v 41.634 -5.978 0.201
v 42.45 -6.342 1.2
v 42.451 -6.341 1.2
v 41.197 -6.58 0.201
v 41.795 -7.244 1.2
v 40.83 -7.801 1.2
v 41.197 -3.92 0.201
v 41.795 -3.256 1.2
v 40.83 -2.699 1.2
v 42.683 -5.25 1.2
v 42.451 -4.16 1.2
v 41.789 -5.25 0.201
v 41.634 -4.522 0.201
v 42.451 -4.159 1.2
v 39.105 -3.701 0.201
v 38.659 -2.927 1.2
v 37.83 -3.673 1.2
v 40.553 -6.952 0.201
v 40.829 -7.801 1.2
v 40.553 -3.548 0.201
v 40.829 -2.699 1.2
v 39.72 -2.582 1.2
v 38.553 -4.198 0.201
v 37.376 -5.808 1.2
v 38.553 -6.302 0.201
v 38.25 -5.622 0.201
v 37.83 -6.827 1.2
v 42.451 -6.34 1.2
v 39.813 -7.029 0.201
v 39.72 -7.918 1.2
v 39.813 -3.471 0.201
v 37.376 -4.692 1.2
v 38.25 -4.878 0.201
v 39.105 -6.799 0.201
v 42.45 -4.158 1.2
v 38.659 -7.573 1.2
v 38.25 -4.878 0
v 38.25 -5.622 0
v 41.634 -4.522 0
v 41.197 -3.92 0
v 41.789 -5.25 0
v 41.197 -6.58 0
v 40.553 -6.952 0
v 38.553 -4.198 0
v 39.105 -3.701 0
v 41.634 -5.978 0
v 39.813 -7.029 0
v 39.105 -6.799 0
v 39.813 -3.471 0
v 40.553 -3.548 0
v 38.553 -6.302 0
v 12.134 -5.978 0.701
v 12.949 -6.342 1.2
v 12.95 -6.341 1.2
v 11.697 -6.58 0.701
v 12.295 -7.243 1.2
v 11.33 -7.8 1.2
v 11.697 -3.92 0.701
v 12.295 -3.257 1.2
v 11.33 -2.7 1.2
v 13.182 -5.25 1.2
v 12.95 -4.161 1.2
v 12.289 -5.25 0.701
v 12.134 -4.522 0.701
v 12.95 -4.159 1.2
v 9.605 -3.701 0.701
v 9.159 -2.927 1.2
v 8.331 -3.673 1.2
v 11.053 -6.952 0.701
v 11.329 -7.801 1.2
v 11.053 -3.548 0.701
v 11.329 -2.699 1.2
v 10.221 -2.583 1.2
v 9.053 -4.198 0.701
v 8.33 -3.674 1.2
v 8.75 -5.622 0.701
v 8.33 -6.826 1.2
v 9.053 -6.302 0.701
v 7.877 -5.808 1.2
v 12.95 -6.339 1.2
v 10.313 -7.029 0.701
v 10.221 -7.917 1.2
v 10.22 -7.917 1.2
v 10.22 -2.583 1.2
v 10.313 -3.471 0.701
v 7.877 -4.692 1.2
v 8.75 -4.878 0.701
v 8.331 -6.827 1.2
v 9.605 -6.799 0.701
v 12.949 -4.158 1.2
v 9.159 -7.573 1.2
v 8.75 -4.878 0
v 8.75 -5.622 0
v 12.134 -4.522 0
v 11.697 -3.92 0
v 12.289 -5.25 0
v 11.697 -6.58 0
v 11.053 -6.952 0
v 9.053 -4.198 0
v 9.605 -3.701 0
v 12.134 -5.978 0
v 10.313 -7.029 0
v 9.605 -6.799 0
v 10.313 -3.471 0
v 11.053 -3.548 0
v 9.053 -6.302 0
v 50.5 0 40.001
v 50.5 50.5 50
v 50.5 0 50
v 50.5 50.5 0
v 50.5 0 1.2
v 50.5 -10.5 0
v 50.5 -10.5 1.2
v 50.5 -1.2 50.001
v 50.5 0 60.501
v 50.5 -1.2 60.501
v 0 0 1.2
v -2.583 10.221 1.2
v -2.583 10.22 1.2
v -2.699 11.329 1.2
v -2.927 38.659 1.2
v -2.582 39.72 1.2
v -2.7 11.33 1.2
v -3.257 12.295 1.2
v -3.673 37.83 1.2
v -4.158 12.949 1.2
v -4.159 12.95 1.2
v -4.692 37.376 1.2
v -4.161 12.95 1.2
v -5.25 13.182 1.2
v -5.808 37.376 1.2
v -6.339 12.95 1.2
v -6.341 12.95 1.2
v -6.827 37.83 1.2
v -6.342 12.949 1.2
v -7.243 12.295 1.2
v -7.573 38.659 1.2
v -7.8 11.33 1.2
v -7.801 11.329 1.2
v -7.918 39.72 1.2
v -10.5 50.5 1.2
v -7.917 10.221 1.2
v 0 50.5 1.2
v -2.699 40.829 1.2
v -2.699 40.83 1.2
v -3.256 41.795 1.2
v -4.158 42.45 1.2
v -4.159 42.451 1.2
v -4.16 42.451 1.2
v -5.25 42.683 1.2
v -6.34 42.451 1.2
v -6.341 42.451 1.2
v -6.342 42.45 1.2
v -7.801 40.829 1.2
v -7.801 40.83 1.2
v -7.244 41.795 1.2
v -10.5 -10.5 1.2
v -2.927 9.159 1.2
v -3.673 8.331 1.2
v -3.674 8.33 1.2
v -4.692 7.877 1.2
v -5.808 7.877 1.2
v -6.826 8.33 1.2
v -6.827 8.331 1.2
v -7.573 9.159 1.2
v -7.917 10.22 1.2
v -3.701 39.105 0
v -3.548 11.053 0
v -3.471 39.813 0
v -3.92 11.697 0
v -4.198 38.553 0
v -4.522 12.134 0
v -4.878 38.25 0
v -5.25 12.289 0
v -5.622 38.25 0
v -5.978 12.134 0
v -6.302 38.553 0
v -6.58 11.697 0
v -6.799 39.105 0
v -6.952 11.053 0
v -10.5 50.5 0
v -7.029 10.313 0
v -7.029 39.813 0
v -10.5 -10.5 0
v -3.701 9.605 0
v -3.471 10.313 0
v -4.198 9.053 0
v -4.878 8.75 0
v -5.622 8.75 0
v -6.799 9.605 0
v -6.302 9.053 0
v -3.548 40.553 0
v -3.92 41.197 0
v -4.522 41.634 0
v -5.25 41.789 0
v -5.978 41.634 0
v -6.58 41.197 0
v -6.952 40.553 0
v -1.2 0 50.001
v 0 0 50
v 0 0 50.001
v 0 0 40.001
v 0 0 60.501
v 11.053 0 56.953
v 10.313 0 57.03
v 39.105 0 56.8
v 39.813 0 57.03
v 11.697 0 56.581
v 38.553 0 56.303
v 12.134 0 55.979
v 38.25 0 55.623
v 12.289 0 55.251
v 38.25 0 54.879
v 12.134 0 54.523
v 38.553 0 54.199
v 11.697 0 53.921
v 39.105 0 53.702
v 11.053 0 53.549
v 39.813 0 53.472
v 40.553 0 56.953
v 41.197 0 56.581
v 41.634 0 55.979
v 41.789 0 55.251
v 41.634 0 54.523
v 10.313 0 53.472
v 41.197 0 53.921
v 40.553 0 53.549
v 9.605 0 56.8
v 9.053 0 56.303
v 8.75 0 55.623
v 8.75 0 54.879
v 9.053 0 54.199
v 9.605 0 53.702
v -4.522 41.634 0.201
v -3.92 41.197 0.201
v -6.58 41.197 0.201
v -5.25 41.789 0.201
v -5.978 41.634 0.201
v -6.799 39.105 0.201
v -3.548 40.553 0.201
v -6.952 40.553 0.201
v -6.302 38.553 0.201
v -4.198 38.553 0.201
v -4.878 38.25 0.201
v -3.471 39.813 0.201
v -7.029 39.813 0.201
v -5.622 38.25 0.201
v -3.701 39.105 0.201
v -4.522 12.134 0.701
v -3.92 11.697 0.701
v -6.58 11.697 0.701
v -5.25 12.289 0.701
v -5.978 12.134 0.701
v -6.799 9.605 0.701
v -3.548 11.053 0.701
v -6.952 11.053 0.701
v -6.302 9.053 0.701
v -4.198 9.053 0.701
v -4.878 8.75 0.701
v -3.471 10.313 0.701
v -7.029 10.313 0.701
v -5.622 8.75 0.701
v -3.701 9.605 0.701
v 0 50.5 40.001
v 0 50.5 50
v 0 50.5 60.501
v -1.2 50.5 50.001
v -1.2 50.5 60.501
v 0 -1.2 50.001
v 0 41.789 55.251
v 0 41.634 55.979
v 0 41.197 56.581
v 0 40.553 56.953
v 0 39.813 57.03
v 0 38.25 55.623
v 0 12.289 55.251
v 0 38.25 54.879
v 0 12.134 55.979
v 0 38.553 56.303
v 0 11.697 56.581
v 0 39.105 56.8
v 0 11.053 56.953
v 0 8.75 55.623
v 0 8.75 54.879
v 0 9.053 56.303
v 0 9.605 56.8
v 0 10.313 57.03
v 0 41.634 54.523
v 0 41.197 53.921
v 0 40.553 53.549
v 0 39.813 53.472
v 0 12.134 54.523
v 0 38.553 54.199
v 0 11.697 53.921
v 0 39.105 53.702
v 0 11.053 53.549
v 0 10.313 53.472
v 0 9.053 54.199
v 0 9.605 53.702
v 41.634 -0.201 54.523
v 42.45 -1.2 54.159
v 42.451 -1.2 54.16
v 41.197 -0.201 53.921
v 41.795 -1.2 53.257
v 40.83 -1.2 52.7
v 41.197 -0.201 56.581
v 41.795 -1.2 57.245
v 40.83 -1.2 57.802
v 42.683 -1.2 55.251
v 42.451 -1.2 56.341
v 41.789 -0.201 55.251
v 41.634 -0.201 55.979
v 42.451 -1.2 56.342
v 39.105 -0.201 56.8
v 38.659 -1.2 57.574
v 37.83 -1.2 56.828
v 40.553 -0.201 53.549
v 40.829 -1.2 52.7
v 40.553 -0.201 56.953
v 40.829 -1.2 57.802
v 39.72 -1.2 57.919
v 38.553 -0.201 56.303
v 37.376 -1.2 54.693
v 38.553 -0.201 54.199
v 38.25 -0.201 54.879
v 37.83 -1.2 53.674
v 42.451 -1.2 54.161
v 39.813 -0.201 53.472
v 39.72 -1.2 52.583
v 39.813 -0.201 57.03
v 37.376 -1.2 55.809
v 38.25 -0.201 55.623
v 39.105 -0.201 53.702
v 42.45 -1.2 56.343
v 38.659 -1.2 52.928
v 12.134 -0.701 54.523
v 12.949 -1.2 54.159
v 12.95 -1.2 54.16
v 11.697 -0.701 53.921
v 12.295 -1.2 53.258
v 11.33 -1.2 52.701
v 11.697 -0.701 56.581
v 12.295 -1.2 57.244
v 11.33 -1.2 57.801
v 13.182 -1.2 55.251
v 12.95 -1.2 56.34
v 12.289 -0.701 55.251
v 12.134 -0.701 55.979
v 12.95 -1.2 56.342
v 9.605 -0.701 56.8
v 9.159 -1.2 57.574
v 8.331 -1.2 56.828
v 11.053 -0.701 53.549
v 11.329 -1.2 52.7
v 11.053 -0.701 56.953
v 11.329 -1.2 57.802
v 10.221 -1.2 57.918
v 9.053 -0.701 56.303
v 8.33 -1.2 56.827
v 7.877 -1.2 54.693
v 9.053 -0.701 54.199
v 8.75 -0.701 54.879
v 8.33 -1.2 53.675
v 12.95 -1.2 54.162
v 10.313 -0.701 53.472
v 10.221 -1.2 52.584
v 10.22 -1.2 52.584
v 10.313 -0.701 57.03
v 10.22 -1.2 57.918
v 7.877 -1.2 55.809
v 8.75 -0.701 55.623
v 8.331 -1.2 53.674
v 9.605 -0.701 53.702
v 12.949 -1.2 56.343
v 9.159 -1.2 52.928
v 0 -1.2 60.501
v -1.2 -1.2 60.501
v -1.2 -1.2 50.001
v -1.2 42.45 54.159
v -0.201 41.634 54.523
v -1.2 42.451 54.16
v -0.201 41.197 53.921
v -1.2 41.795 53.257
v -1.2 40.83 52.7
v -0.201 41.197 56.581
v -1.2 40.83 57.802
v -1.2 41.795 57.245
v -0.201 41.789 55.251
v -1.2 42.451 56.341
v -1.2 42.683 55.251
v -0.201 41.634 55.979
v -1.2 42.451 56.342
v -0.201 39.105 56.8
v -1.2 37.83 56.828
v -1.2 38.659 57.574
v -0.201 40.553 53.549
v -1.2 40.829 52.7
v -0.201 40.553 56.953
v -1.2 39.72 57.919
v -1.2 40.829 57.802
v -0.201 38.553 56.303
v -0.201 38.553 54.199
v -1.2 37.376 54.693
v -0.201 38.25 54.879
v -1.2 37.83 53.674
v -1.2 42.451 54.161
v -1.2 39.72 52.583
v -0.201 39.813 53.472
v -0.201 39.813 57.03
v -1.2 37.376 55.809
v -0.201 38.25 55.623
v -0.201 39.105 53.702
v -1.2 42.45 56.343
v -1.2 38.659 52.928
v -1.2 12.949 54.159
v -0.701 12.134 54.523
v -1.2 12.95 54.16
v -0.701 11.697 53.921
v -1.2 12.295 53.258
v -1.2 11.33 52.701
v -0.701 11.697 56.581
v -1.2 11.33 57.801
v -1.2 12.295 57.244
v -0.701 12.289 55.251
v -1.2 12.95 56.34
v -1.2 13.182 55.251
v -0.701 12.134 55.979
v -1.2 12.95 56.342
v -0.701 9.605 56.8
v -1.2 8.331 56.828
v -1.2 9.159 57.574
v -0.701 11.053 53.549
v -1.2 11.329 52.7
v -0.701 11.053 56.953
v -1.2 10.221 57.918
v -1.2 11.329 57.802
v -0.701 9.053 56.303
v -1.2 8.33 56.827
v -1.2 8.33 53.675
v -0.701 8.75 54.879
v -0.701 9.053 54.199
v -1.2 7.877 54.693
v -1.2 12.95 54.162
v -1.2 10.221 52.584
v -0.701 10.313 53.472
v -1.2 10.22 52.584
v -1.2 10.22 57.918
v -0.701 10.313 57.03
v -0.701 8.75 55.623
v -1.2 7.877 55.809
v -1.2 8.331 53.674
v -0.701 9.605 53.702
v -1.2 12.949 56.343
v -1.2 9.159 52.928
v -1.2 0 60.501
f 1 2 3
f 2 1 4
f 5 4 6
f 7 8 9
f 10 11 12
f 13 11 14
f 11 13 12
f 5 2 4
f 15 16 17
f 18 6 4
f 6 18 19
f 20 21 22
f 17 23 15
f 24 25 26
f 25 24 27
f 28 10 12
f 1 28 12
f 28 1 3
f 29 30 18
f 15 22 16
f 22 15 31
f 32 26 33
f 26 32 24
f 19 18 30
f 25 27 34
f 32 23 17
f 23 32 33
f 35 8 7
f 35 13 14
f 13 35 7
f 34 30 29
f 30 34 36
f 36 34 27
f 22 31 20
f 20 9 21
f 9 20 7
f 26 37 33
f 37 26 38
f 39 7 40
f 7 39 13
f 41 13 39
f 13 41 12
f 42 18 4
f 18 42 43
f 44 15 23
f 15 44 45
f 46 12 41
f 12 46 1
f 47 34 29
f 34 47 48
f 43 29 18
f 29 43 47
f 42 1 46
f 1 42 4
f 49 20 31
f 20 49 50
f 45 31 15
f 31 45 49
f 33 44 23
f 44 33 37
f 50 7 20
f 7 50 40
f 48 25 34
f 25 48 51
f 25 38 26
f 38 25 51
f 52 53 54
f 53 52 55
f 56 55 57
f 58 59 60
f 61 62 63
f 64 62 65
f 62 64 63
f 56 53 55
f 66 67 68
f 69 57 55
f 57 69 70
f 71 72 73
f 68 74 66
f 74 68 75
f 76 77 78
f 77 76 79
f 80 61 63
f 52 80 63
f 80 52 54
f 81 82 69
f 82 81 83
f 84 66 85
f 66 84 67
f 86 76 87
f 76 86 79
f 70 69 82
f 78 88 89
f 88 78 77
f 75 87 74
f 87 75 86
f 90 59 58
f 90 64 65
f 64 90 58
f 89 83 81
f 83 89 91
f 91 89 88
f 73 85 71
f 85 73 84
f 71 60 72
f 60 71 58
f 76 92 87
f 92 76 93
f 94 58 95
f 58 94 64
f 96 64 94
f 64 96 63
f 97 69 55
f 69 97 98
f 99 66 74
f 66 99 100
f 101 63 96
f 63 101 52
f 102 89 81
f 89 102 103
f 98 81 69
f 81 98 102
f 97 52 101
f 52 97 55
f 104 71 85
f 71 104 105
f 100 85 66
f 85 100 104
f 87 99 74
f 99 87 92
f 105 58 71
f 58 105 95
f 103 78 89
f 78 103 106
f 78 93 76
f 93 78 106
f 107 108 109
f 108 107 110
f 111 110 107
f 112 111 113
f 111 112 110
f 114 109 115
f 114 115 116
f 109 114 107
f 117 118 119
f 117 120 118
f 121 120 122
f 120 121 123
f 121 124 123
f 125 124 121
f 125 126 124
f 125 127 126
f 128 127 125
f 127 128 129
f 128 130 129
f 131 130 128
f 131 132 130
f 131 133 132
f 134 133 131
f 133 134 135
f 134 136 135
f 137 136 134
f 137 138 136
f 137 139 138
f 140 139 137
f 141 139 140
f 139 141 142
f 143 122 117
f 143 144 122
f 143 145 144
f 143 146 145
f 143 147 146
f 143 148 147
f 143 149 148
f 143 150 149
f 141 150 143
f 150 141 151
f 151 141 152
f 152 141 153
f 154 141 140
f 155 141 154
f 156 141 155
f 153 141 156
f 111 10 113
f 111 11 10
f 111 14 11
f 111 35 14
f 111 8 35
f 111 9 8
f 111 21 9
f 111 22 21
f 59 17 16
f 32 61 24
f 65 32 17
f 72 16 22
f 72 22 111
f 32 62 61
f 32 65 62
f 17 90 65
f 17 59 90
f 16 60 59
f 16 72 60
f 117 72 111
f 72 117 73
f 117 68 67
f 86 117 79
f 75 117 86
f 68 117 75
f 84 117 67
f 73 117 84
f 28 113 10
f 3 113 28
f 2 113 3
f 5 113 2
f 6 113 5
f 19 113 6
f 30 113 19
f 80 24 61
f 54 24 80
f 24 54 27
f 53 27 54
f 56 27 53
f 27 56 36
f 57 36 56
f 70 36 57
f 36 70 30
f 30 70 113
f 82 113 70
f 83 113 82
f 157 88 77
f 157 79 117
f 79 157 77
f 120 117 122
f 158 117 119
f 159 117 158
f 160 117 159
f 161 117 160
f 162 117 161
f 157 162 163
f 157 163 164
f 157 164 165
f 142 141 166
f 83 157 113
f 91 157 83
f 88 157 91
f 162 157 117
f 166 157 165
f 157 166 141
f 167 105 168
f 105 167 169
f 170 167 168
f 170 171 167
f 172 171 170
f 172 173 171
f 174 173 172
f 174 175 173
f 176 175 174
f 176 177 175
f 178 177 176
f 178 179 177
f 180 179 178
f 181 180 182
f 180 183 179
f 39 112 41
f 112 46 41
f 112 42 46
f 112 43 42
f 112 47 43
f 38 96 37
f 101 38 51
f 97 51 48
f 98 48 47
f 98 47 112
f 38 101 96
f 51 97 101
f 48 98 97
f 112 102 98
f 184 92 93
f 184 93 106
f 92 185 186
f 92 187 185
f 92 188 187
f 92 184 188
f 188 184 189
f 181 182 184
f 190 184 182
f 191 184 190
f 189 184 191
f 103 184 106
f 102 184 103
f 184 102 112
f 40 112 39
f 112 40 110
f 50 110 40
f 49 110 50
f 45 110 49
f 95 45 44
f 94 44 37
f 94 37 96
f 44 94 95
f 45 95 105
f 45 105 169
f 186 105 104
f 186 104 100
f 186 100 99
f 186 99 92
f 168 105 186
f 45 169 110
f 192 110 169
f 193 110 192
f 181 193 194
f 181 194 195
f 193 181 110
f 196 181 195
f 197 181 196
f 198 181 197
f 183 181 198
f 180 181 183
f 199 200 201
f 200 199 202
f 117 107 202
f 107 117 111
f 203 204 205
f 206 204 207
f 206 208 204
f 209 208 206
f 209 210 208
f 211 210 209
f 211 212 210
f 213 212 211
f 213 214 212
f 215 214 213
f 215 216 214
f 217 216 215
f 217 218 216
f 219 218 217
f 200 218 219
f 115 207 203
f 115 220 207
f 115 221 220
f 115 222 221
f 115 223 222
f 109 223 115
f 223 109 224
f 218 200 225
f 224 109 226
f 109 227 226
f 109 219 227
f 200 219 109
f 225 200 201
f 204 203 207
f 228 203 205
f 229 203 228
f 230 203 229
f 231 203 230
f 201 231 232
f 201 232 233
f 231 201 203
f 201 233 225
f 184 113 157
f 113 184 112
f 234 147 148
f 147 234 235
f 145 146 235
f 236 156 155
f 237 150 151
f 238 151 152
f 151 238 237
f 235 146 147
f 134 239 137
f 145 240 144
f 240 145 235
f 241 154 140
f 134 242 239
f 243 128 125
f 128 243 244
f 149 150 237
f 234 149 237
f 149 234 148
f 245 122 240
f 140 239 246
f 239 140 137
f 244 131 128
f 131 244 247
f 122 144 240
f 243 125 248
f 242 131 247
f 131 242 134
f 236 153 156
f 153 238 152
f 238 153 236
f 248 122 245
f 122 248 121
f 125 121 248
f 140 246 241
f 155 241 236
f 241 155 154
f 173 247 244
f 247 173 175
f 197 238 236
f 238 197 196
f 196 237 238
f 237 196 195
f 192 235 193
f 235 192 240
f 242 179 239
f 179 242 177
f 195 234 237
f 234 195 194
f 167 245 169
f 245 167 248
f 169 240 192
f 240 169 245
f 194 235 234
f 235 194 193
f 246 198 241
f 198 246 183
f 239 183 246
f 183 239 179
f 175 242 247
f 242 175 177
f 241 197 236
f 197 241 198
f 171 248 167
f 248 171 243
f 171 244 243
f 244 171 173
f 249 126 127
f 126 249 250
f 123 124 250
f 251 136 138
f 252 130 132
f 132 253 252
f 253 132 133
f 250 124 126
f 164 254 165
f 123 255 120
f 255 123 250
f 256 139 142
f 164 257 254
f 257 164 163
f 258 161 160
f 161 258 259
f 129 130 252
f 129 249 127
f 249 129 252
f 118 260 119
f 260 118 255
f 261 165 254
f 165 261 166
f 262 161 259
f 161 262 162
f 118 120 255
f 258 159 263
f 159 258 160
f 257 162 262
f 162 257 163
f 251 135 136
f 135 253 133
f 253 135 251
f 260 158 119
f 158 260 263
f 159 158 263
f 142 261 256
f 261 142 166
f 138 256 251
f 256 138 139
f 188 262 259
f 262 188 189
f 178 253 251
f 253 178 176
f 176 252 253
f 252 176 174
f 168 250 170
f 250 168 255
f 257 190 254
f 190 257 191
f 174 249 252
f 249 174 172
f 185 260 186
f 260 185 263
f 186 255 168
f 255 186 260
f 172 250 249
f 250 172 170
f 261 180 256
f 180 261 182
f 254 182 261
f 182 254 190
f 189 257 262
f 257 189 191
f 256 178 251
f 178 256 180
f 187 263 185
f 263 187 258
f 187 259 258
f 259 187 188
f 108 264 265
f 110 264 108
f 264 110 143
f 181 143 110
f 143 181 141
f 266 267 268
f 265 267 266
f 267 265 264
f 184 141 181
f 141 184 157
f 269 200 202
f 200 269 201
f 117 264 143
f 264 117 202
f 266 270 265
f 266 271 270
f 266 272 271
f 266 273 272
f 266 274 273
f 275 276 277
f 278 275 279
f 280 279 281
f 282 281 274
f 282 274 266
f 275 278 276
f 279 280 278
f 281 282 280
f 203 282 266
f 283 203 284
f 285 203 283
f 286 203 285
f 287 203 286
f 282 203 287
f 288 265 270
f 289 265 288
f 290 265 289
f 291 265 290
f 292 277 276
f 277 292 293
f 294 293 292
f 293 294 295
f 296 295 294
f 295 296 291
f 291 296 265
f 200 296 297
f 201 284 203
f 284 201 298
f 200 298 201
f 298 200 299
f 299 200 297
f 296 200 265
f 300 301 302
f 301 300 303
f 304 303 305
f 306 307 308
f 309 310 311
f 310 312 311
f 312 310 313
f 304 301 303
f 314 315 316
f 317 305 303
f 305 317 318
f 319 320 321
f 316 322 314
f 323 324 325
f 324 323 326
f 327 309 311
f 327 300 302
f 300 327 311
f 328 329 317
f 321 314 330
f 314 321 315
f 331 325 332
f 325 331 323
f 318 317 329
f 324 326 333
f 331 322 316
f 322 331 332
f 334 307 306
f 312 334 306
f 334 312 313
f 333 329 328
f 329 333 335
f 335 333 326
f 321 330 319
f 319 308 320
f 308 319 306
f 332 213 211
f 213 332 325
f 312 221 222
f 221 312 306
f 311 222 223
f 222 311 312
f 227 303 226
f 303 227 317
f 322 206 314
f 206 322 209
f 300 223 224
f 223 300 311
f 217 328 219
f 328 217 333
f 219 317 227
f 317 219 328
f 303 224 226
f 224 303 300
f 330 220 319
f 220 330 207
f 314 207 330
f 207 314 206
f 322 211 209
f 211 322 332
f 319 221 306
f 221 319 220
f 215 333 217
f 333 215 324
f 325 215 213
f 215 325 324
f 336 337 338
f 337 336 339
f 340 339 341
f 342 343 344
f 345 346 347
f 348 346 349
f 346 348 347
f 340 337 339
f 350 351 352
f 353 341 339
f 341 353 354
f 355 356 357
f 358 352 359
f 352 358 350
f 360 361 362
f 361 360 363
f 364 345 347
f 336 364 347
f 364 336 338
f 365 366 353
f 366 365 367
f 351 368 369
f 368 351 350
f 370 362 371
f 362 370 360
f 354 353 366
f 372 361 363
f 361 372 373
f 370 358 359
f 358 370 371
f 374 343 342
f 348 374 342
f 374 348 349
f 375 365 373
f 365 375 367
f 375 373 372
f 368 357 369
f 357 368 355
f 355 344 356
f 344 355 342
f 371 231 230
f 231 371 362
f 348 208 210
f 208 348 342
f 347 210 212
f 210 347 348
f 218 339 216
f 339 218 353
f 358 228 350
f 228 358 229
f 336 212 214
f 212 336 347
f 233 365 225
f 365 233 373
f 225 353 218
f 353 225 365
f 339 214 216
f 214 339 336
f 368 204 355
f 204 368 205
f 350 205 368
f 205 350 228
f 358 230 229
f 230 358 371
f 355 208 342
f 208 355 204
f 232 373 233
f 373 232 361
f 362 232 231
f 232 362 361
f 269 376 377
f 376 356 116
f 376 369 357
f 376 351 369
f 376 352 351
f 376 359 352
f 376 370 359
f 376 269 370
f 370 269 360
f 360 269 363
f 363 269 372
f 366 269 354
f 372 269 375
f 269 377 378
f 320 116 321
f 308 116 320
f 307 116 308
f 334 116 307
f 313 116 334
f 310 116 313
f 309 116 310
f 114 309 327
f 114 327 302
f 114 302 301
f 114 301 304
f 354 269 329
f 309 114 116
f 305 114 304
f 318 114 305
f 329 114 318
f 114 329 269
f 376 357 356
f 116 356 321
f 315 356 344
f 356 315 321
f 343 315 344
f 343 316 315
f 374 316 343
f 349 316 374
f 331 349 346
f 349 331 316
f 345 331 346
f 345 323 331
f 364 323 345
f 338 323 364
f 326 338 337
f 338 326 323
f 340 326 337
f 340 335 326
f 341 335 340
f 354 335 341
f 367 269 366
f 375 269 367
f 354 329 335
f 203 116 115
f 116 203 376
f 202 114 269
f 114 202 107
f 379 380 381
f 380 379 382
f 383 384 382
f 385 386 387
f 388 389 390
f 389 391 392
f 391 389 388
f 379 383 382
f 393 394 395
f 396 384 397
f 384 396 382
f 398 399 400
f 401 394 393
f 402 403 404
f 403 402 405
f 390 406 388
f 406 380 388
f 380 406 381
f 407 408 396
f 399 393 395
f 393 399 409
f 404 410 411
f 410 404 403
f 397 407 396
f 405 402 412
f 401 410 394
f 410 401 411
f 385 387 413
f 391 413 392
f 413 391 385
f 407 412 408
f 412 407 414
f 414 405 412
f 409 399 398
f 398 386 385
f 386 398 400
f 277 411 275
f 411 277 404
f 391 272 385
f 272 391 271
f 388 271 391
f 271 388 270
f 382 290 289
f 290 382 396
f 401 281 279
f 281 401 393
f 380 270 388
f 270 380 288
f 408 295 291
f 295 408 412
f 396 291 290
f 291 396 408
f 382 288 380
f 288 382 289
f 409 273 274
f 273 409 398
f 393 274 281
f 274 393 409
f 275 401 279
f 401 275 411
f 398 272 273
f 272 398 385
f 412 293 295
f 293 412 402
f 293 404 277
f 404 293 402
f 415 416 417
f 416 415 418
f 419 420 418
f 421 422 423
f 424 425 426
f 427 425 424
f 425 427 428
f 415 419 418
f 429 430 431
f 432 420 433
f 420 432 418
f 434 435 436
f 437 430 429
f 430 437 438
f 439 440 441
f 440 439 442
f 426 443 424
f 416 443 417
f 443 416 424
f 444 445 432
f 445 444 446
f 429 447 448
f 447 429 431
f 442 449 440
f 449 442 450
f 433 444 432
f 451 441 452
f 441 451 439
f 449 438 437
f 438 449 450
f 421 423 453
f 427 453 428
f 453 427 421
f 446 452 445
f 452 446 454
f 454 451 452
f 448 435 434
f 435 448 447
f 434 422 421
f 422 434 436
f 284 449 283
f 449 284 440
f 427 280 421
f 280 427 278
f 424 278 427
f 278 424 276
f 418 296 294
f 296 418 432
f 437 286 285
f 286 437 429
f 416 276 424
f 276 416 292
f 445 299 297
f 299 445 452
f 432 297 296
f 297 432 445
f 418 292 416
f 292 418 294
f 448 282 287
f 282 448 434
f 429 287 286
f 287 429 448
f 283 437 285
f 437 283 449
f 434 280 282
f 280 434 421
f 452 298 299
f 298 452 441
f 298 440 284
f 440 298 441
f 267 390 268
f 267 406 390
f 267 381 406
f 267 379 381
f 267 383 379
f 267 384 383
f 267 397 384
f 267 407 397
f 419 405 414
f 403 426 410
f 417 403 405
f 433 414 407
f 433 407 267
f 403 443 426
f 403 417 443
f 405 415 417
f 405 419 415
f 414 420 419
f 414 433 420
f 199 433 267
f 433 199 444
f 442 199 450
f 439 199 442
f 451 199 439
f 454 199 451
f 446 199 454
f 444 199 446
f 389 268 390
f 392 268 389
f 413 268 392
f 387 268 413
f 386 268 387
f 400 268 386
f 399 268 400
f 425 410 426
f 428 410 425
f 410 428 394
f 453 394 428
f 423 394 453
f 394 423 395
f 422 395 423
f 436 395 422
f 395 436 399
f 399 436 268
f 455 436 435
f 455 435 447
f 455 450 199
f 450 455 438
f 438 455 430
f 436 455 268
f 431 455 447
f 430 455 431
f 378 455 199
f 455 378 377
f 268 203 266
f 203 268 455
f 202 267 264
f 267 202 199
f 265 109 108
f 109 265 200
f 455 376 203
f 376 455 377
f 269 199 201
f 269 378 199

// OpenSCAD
// file: ../lib/shapes.scad
module prism(w, l, h, center=true) {
	if (center) {
		translate([-w/2, -l/2, -h/2]) prism(w, l, h, false);
	} else {
		polyhedron(points=[
			[0,0,h],
			[0,0,0],[w,0,0],
			[0,l,h],
			[0,l,0],[w,l,0]
		], faces=[
			[0,2,1],
			[3,4,5],
			[0,1,4,3],
			[1,2,5,4],
			[0,3,5,2],
		]);
	}
}
// file: ../lib/hole.scad
module cylinder_outer(h,d=undef,d1=undef,d2=undef,fn=15) {
	fudge = cos(180/fn);
	cylinder(h=h,d=d/fudge,d1=d1/fudge,d2=d2/fudge,$fn=fn);
}

module hole(d, height, countersink=0, extra_above=false) {
	height = height - countersink;
	translate([0, 0, -(height+countersink)]) {
		translate([0, 0, height+0.001]) cylinder_outer(d1=d, d2=d*1.5, h=countersink);
		if (extra_above) {
			translate([0, 0, height+0.001]) cylinder_outer(d1=d, d2=d*2, h=countersink*3/2);
		}
		if (height > 0)
			translate([0, 0, -2]) cylinder_outer(d=d, h=height+2.1);
	}
}

module nut_trap(w, h, sides){
	cylinder(r = w / 2 / cos(180 / 6) + 0.05, h=h, $fn=6);
}

module rim(id, od, h) {
	difference() {
		cylinder_outer(h=h, d=od);
		translate([0, 0, -1]) cylinder(h=h+2, d=id);
	}
}

rim(8.5, 13, 2);
// main file
// LACK table has horizontal inner dimension of 450mm and vertical of 40mm. This extender increases vertical by 50mm to match

use <../lib/hole.scad>;
use <../lib/shapes.scad>

$fn = 50;

d = 50.5;
h = 50;
hole = 3.5;
extension = hole * 3;
thickness = 1.2;

cube([d, d, h]);
translate([0, -extension, 0]) base_extension();
rotate(90) base_extension();
translate([-extension, -extension, 0]) cube([extension, extension, thickness]);

translate([0, -thickness, h+0.001]) top_extension();
translate([-thickness, 0, h+0.001]) scale([-1, 1, 1]) rotate(90) top_extension();
translate([-thickness, -thickness, h+0.001]) cube([thickness, thickness, extension]);

module base_extension(b=false) {
	difference() {
		cube([d, extension, thickness]);
		translate([d - extension, extension/2, thickness]) hole(hole, thickness, 1);
		translate([extension, extension/2, thickness]) hole(hole, thickness, 0.5);
	}
	if(b) {
		//rotate([180, 0, 90]) prism(thickness, d, thickness, false);
		rotate([180, 180, 90]) prism(10, d, thickness, false);
		//bevel(d, thickness);
	}
}

module top_extension() {
	translate([0, thickness, 0]) rotate([90, 0, 0]) base_extension(true); 
	//cube([d, thickness, extension]);
}
